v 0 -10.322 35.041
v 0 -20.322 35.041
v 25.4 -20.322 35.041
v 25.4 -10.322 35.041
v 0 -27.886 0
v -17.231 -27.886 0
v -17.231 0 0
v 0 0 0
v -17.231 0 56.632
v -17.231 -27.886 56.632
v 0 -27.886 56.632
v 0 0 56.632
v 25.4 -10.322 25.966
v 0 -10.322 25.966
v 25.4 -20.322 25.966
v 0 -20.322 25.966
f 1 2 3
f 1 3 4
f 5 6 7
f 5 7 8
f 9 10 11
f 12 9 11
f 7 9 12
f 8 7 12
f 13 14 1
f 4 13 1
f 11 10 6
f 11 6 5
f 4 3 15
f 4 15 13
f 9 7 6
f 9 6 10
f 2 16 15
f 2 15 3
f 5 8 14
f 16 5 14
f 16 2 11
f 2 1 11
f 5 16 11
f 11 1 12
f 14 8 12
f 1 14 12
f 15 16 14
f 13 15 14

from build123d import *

# Parameters (mm, degrees)
F0_W     = 17.23101
F0_H     = 56.631804
F1_DEPTH = 27.886009
F2_W     = 10
F2_H     = 9.07563
F3_DEPTH = 25.4


with BuildPart() as f1:
    # F0 (on Front) → F1 (new body)
    with BuildSketch(Plane.XZ):
        with Locations((-8.615505, 28.315902)):
            Rectangle(F0_W, F0_H)
    extrude(amount=F1_DEPTH)

    # F2 (on face) → F3 (join)
    with BuildSketch(Plane.YZ):
        with Locations((-15.322338, 30.503517)):
            Rectangle(F2_W, F2_H)
    extrude(amount=F3_DEPTH)


solid = f1.part
